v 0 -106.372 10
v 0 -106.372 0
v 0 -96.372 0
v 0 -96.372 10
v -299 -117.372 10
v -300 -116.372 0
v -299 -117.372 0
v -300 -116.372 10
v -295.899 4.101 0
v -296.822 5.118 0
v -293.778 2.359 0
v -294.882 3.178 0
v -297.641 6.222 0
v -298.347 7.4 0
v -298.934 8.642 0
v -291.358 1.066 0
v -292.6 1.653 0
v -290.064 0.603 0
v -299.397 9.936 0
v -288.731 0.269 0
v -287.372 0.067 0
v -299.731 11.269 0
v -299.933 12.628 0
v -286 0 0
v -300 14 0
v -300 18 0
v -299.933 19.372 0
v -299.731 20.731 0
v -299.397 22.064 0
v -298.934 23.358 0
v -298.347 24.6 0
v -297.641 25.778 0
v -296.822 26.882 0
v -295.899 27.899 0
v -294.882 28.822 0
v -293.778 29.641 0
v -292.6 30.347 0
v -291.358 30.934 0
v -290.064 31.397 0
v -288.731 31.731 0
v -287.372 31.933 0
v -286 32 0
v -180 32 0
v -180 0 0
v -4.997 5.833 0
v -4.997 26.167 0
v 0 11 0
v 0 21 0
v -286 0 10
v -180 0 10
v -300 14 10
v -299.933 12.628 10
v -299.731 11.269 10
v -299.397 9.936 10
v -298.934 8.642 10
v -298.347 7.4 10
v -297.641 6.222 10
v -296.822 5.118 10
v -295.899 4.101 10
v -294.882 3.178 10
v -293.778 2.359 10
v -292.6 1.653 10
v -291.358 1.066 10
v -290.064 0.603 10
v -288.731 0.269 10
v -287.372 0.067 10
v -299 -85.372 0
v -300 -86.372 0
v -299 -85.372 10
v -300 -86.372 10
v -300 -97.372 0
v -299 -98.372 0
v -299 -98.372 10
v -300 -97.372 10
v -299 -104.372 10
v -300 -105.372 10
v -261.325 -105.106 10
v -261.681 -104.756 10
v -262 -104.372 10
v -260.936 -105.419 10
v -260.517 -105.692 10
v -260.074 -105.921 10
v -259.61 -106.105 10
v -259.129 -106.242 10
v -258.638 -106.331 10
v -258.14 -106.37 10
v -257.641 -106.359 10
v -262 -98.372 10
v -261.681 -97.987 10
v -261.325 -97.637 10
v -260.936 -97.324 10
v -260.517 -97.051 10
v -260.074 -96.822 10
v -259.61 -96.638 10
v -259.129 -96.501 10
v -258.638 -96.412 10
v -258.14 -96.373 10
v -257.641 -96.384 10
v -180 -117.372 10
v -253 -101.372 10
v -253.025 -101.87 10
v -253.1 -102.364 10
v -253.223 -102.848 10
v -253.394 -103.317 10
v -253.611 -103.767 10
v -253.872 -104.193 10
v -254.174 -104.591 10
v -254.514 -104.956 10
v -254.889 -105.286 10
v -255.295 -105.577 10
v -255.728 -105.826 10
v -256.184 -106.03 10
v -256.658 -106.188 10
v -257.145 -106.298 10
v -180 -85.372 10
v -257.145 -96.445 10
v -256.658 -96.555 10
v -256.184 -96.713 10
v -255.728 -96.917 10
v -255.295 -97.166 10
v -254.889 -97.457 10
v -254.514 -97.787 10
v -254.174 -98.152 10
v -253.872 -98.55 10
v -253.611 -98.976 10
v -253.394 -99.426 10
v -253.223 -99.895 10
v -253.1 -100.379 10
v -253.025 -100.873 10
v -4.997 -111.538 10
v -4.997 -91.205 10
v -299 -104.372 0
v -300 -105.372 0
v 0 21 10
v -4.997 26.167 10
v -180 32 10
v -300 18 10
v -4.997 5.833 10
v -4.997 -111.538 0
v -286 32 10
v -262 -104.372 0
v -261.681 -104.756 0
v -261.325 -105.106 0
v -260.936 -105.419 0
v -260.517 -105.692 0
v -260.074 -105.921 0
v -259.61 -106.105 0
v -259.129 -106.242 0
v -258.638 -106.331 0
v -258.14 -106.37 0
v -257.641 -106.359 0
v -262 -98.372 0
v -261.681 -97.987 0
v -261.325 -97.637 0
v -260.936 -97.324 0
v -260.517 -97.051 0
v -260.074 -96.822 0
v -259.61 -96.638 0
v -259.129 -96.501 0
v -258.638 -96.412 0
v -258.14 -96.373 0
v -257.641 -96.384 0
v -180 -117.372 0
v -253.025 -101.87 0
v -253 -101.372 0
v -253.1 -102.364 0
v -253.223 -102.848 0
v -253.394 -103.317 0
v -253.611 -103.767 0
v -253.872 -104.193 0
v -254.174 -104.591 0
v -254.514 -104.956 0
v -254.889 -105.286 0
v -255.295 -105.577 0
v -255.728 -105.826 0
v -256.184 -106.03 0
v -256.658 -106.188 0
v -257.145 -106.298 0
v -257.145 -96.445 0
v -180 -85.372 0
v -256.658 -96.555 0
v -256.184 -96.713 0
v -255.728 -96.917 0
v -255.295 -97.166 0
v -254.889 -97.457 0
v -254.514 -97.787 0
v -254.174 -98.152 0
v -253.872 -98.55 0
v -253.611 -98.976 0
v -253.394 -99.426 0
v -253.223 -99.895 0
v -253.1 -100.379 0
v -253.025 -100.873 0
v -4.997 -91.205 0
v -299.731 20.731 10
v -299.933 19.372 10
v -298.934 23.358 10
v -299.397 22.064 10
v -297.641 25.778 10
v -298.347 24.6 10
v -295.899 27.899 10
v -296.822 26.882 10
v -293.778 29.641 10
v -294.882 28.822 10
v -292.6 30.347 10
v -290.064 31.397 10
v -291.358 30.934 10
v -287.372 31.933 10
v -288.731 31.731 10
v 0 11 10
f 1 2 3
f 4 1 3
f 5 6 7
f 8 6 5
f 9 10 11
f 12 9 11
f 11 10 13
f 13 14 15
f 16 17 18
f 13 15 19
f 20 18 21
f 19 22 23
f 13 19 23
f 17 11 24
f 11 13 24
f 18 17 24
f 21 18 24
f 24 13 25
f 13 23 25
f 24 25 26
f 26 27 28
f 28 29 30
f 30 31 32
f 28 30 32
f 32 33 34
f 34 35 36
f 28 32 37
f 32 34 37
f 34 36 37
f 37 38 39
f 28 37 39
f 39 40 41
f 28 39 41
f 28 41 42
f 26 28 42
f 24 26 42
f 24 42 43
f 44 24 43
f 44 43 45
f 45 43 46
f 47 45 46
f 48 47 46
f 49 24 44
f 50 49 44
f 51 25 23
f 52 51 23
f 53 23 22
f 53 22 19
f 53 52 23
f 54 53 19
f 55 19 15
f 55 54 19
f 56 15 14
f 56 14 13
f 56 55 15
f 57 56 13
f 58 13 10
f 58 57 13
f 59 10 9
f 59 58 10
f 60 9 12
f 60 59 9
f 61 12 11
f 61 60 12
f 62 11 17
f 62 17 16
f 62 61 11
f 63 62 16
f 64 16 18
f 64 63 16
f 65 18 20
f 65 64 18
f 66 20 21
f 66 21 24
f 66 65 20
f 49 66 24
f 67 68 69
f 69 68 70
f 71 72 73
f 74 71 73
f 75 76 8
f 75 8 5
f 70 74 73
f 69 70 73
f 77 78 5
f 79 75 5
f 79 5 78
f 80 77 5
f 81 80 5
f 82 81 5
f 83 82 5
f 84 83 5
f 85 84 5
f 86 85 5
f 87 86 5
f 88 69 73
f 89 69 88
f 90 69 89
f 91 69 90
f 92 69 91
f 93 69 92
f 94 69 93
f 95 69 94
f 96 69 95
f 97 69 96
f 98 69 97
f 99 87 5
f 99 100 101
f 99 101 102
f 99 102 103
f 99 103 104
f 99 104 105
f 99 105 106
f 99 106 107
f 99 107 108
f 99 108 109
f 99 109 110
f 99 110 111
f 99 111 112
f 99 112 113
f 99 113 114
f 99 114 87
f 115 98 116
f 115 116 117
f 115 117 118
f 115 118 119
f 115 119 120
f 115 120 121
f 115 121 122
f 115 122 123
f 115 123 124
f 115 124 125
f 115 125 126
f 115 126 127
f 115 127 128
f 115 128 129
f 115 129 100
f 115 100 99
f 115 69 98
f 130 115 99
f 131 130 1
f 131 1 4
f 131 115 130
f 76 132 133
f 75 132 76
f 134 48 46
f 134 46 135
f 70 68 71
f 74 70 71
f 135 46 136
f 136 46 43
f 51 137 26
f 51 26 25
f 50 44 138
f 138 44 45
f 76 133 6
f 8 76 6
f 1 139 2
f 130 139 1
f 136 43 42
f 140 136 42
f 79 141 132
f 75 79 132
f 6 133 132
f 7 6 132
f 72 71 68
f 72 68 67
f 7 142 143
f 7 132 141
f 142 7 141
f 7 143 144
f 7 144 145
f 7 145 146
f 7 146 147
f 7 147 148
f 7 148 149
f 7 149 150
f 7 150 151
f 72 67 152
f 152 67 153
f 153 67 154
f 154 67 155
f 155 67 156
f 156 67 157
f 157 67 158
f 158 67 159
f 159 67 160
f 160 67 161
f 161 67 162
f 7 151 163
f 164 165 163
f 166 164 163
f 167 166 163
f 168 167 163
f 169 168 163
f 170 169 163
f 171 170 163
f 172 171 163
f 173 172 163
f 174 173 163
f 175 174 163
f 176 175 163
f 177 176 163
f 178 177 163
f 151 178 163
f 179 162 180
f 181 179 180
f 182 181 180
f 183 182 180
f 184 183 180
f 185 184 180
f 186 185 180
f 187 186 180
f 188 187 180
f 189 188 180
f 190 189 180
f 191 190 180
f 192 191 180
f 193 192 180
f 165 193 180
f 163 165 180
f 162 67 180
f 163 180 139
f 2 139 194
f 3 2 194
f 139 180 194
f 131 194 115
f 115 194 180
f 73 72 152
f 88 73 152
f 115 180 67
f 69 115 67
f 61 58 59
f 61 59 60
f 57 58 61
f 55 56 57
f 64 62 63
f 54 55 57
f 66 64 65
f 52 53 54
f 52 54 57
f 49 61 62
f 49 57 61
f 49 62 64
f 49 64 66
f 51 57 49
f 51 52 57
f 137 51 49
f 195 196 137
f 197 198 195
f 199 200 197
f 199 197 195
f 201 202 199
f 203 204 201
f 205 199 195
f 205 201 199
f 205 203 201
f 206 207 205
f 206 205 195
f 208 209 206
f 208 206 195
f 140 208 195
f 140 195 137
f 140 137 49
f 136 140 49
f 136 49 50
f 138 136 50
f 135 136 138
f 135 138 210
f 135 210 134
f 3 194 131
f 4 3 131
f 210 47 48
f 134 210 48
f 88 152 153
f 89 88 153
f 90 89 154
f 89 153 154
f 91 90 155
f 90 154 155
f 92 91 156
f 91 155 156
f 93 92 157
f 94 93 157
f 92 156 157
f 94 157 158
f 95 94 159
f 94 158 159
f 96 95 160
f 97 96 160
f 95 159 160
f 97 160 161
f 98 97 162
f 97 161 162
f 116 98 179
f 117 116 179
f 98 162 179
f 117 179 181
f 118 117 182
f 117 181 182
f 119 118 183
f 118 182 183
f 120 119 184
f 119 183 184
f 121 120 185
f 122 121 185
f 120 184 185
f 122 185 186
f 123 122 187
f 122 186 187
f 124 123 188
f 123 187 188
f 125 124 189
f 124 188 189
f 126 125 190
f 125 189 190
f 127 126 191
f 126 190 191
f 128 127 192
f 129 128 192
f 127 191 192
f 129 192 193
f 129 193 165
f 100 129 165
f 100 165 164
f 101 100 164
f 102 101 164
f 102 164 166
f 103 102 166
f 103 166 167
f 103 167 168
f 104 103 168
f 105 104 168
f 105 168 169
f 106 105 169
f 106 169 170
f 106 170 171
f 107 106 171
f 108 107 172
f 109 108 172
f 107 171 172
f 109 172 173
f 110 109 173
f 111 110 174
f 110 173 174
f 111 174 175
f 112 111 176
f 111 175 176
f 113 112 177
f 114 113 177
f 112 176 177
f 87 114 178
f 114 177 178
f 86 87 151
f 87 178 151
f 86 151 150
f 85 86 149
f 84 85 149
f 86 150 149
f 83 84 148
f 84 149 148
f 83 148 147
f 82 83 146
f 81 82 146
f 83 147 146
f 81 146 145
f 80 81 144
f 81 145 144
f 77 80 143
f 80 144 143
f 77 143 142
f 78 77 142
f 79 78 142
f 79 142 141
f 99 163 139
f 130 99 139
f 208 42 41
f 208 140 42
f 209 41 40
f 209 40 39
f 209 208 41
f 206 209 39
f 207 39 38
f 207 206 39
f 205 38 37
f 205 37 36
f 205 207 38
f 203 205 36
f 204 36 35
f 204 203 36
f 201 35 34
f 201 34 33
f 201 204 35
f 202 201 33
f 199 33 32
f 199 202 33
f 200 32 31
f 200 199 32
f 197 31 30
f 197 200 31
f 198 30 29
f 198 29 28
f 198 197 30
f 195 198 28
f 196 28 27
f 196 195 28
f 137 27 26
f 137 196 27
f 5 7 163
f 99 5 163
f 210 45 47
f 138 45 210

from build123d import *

# Parameters (mm, degrees)
F1_DEPTH = 10
F2_R     = 14
F3_SIZE  = 5
F4_SIZE  = 1


with BuildPart() as f1:
    # F0 (on Top) → F1 (new body)
    with BuildSketch(Plane.XY):
        with BuildLine():
            Line((-1.2e-05, -111.371517), (-1.2e-05, -91.371517))
            Line((-1.2e-05, -91.371517), (-180.000012, -85.371517))
            Line((-180.000012, -85.371517), (-300.000012, -85.371517))
            Line((-300.000012, -85.371517), (-300.000012, -98.371517))
            Line((-300.000012, -98.371517), (-262.000012, -98.371517))
            ThreePointArc((-262.000012, -98.371517), (-253.000012, -101.371517), (-262.000012, -104.371517))
            Line((-262.000012, -104.371517), (-300.000012, -104.371517))
            Line((-300.000012, -104.371517), (-300.000012, -117.371517))
            Line((-300.000012, -117.371517), (-180.000012, -117.371517))
            Line((-180.000012, -117.371517), (-1.2e-05, -111.371517))
        make_face()
        Polygon((0, 6), (0, 26), (-180, 32), (-300, 32), (-300, 0), (-180, 0), align=None)
    extrude(amount=F1_DEPTH)

    # F2
    f2_edges = [f1.edges().sort_by_distance(p)[0] for p in [
        (-300, 32, 5),
        (-300, 0, 5),
    ]]
    fillet(f2_edges, radius=F2_R)

    # F3
    f3_edges = [f1.edges().sort_by_distance(p)[0] for p in [
        (0, 26, 5),
        (0, 6, 5),
        (-1.2e-05, -91.371517, 5),
        (-1.2e-05, -111.371517, 5),
    ]]
    chamfer(f3_edges, length=F3_SIZE)

    # F4
    f4_edges = [f1.edges().sort_by_distance(p)[0] for p in [
        (-300.000012, -85.371517, 5),
        (-300.000012, -98.371517, 5),
        (-300.000012, -104.371517, 5),
        (-300.000012, -117.371517, 5),
    ]]
    chamfer(f4_edges, length=F4_SIZE)


solid = f1.part
